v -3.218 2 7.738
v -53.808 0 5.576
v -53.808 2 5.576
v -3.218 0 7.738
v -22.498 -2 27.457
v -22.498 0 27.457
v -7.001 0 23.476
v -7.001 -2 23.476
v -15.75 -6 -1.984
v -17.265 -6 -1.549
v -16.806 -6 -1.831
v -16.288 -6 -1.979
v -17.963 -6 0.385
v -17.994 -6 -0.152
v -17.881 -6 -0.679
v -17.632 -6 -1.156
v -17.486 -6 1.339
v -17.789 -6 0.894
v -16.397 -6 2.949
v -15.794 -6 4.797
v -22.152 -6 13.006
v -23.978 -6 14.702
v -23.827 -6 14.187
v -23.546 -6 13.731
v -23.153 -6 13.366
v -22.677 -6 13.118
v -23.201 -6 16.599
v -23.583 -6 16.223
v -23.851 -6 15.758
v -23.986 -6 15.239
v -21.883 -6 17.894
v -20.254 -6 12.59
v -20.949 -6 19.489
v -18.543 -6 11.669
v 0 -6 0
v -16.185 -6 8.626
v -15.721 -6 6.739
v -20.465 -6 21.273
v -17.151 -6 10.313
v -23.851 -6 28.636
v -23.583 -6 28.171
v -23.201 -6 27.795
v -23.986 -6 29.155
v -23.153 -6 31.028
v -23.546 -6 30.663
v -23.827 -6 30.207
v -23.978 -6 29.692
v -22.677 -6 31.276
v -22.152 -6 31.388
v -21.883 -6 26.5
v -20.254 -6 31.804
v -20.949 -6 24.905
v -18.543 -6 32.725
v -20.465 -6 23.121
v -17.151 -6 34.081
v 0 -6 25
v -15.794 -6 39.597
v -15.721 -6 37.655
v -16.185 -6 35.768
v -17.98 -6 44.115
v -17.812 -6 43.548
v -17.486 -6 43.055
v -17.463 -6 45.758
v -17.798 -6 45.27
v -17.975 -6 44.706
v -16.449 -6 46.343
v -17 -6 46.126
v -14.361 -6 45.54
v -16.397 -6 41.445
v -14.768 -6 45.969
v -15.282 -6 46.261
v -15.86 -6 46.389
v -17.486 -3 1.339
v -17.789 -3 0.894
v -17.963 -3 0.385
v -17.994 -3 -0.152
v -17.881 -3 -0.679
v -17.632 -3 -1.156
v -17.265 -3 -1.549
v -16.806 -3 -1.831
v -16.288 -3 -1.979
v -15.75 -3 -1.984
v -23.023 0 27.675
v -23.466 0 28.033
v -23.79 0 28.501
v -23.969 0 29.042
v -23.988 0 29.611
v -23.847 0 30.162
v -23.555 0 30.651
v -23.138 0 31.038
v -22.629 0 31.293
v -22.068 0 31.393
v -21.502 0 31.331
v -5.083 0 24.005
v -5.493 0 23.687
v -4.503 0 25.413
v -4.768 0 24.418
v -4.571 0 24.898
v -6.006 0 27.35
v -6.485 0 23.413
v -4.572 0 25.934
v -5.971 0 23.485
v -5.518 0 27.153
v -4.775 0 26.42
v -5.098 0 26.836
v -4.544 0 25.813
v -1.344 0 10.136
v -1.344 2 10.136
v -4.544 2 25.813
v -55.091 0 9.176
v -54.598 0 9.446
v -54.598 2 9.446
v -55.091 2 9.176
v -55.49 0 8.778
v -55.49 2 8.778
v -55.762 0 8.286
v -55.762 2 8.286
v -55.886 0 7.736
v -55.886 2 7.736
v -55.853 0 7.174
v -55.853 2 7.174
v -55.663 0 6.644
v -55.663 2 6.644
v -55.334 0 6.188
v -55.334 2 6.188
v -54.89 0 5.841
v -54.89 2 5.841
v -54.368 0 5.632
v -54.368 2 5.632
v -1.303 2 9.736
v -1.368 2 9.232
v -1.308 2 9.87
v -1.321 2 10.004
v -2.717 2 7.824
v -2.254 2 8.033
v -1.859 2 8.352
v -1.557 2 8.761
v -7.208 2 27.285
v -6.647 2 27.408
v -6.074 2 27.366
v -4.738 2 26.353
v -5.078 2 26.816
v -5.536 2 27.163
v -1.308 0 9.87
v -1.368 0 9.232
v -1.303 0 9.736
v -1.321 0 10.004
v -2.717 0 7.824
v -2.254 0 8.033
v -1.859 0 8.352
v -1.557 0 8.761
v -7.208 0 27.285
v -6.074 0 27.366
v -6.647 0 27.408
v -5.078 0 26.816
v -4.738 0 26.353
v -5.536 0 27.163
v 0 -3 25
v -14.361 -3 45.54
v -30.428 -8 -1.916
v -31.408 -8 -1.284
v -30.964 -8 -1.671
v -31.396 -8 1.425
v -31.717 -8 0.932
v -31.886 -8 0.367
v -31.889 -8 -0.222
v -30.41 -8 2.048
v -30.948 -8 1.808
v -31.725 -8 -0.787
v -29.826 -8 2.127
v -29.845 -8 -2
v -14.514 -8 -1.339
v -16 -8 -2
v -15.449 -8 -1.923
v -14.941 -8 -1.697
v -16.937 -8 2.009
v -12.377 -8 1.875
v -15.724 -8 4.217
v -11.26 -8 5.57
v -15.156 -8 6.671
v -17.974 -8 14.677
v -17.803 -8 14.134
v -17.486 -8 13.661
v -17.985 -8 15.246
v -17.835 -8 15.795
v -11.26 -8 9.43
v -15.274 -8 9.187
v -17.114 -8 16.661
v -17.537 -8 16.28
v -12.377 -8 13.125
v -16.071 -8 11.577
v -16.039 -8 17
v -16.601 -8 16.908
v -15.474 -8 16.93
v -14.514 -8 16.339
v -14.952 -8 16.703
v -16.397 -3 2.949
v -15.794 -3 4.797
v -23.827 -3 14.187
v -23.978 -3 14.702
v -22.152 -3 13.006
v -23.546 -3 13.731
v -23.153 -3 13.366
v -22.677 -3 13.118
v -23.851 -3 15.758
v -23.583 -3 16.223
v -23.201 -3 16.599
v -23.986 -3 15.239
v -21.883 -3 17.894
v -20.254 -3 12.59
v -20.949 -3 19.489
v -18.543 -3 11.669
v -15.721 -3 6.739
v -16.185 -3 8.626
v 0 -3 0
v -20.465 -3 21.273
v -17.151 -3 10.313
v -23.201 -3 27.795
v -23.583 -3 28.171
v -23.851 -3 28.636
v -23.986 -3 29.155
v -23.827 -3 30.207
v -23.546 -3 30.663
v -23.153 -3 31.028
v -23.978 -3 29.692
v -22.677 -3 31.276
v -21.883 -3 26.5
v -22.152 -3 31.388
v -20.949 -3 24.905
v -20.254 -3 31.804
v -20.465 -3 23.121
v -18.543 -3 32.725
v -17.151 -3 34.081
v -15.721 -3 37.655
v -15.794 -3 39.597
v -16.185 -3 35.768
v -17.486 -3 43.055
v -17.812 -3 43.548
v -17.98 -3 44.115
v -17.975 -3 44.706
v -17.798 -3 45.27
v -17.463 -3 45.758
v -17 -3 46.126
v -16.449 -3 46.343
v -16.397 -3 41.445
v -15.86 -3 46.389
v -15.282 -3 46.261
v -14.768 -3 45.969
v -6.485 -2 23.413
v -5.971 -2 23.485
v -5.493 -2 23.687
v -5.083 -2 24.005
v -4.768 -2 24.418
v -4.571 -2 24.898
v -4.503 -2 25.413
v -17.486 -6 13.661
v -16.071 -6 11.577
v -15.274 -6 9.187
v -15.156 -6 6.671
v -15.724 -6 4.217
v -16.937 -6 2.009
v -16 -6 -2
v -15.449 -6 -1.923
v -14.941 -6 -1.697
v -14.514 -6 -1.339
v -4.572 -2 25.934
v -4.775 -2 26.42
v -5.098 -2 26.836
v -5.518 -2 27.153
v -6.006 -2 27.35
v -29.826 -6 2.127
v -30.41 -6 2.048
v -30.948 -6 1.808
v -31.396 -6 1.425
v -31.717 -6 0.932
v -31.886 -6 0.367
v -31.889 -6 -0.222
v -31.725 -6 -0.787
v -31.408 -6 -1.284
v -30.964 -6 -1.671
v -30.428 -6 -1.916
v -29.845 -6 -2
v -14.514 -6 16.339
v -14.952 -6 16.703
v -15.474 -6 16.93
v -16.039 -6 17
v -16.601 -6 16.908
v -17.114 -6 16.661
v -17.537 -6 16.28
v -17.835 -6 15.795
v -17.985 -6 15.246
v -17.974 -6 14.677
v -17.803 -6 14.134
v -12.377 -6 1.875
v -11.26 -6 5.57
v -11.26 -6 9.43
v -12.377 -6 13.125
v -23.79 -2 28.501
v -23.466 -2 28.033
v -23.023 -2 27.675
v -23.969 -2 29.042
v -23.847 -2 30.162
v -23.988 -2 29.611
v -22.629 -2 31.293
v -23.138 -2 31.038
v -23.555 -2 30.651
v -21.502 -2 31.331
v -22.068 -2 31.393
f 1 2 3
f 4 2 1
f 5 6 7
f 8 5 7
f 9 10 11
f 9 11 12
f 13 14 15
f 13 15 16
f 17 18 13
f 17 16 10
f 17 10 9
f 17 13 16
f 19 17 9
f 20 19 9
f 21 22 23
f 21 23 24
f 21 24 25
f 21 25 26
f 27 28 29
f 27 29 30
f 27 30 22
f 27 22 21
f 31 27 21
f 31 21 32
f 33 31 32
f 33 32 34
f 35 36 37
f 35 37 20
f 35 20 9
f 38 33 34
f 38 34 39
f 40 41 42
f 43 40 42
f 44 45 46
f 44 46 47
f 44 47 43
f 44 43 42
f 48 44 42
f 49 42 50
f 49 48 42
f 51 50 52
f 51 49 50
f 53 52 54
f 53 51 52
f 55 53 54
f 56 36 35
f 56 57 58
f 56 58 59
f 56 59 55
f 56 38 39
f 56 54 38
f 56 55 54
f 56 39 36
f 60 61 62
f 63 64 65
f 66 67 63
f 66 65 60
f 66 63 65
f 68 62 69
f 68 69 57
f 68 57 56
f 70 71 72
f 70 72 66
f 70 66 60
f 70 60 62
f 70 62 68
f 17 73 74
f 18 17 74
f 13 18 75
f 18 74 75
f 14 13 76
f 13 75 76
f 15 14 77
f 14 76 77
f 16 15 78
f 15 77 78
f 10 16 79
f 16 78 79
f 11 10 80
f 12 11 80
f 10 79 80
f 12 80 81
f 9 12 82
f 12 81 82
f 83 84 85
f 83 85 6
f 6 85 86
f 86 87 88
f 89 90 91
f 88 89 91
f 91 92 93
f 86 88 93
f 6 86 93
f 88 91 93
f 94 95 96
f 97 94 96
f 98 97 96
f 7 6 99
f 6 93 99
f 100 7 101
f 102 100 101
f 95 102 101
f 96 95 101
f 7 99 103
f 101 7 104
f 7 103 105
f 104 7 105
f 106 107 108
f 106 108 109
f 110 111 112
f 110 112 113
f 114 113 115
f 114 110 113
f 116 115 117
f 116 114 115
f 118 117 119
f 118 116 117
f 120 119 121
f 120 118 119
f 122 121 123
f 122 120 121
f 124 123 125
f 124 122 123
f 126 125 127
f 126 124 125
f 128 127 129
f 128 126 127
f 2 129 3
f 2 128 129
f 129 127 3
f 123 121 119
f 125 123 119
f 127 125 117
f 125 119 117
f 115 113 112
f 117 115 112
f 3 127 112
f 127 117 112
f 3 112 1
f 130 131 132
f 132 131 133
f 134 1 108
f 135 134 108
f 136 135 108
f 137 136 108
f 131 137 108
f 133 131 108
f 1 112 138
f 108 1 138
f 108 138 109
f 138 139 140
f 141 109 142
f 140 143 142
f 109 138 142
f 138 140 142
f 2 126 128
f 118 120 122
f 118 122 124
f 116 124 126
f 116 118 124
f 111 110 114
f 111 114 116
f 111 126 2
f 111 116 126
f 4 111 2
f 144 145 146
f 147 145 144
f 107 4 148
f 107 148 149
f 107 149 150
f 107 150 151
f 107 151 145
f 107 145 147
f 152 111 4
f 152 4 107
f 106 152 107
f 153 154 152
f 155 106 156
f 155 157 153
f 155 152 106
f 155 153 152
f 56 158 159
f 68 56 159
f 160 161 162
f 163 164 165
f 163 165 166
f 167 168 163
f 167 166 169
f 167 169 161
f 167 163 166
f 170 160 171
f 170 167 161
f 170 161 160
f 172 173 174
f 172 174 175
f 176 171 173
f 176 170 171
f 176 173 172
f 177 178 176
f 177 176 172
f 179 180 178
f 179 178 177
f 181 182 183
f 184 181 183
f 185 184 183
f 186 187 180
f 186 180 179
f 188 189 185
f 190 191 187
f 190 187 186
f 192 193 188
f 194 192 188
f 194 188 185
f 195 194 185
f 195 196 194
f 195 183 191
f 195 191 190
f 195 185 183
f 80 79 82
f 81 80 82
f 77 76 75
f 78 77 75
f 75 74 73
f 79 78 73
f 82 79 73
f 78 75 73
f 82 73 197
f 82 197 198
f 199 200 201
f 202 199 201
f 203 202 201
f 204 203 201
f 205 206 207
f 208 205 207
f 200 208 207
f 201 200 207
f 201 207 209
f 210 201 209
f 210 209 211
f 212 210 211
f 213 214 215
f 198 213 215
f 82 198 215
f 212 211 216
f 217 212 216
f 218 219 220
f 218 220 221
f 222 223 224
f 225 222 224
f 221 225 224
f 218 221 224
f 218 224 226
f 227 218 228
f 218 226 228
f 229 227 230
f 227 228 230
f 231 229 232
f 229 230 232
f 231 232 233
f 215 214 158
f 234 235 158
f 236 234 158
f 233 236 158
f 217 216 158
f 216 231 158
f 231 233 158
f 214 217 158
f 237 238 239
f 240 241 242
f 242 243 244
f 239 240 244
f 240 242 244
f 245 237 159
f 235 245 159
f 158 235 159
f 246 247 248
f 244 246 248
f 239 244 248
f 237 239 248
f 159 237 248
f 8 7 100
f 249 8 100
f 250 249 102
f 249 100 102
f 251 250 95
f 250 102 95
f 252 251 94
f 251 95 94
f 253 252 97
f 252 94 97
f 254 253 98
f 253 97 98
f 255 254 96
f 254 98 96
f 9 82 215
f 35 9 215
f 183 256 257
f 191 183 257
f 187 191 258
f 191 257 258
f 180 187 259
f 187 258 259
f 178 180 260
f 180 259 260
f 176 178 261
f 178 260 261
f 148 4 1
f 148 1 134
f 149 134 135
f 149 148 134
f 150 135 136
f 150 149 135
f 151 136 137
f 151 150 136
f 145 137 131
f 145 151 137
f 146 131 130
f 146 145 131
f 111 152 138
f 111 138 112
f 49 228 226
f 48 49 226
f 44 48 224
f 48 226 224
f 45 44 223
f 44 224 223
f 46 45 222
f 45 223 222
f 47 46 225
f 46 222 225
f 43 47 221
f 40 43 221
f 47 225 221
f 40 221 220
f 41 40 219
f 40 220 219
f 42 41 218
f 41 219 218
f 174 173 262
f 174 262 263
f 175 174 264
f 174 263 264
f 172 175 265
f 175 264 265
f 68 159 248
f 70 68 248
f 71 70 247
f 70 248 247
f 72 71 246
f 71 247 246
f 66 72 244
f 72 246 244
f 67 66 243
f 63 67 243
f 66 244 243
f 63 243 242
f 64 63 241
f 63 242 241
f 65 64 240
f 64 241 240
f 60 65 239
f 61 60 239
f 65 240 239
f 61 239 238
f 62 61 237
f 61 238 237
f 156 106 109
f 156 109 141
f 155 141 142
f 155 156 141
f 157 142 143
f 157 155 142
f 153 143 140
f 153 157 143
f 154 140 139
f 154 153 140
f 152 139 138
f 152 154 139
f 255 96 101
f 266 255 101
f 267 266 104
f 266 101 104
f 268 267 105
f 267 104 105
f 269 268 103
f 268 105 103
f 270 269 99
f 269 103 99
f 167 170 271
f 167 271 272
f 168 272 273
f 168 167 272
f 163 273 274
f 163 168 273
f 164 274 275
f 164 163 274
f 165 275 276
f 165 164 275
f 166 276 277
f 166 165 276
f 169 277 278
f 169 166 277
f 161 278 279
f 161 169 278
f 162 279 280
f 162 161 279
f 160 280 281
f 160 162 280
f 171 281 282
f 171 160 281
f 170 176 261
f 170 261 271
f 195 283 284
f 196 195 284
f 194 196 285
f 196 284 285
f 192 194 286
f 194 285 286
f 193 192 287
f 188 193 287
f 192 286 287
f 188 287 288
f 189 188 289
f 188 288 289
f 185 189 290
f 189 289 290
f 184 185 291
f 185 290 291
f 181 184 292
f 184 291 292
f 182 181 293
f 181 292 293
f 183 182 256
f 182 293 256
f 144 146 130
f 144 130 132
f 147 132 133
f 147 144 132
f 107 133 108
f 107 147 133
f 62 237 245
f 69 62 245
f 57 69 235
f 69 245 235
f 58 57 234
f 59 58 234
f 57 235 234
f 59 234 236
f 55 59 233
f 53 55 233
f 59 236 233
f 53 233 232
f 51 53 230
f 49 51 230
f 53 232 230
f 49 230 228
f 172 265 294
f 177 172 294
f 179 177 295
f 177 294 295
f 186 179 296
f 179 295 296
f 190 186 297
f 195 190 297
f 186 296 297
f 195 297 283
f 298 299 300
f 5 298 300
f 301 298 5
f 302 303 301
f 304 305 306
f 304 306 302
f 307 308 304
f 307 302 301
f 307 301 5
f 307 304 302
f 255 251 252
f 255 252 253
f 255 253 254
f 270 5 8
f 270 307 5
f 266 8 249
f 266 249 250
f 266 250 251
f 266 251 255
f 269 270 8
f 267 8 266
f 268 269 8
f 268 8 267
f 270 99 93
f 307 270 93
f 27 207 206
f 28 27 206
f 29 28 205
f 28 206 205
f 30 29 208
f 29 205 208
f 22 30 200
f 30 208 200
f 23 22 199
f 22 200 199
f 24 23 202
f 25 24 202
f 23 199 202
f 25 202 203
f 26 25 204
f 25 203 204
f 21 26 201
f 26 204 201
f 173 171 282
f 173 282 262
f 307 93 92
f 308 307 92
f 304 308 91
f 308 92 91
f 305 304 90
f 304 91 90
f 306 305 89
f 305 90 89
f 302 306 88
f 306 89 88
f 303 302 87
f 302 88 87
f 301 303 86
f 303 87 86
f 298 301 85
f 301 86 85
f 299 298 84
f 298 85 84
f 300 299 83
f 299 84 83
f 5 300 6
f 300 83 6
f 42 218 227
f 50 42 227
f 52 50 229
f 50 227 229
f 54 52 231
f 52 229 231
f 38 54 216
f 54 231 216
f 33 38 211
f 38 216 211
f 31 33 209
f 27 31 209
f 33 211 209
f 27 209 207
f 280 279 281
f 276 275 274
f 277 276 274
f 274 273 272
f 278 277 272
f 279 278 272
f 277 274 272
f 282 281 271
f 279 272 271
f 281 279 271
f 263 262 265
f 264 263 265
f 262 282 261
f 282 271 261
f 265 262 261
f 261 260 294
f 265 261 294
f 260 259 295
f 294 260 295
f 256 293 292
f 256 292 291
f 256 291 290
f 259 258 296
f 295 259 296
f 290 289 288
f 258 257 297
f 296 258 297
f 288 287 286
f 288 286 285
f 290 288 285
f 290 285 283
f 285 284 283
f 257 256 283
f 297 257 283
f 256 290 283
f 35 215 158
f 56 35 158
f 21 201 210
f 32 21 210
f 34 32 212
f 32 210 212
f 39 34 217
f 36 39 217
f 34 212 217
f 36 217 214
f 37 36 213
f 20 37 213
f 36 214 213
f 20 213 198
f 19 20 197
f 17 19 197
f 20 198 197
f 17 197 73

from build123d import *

# Parameters (mm, degrees)
F2_DEPTH  = 2
F4_DEPTH  = 2
F7_DEPTH  = 3
F10_DEPTH = 2
F12_DEPTH = 2


with BuildPart() as f2:
    # F1 (on Front) → F2 (new body)
    with BuildSketch(Plane.XZ):
        with BuildLine():
            ThreePointArc((-22.4976340457, 27.4567758947), (-20.7742896124, 27.8134864408), (-20, 29.3938769134))
            ThreePointArc((-20, 29.3938769134), (-20.4196095275, 30.619587301), (-21.5023659543, 31.3309779321))
            ThreePointArc((-21.5023659543, 31.3309779321), (-23.9371010187, 29.8915109591), (-22.4976340457, 27.4567758947))
        make_face()
        with BuildLine():
            ThreePointArc((-4.5031918506, 25.4128045476), (-4.9228013781, 26.6385149352), (-6.0055578049, 27.3499055663))
            ThreePointArc((-6.0055578049, 27.3499055663), (-8.4402928693, 25.9104385933), (-7.0008258964, 23.4757035289))
            ThreePointArc((-7.0008258964, 23.4757035289), (-5.277481463, 23.832414075), (-4.5031918506, 25.4128045476))
        make_face()
        with BuildLine():
            ThreePointArc((-21.5023659543, 31.3309779321), (-20.4196095275, 30.619587301), (-20, 29.3938769134))
            ThreePointArc((-20, 29.3938769134), (-20.7742896124, 27.8134864408), (-22.4976340457, 27.4567758947))
            Line((-22.4976340457, 27.4567758947), (-7.0008258964, 23.4757035289))
            ThreePointArc((-7.0008258964, 23.4757035289), (-8.4402928693, 25.9104385933), (-6.0055578049, 27.3499055663))
            Line((-6.0055578049, 27.3499055663), (-21.5023659543, 31.3309779321))
        make_face()
    extrude(amount=F2_DEPTH)


with BuildPart() as f4:
    # F3 (on Front) → F4 (new body)
    with BuildSketch(Plane.XZ):
        with BuildLine():
            ThreePointArc((-7.2077649929, 27.2845889067), (-7.6413600534, 23.7682459009), (-4.5031918506, 25.4128045476))
            ThreePointArc((-4.5031918506, 25.4128045476), (-4.5133195446, 25.6138224716), (-4.5436000564, 25.8128045476))
            ThreePointArc((-4.5436000564, 25.8128045476), (-5.5360800401, 27.1634315055), (-7.2077649929, 27.2845889067))
        make_face()
        with BuildLine():
            ThreePointArc((-4.5436000564, 25.8128045476), (-4.5133195446, 25.6138224716), (-4.5031918506, 25.4128045476))
            ThreePointArc((-4.5031918506, 25.4128045476), (-7.6413600534, 23.7682459009), (-7.2077649929, 27.2845889067))
            Line((-7.2077649929, 27.2845889067), (-54.5975598486, 9.4462217298))
            ThreePointArc((-54.5975598486, 9.4462217298), (-52.7548185036, 9.2189960173), (-51.8929867063, 7.5744373707))
            ThreePointArc((-51.8929867063, 7.5744373707), (-52.4489024417, 6.1907391967), (-53.8076073431, 5.5762606107))
            Line((-53.8076073431, 5.5762606107), (-3.2178124874, 7.7378934337))
            ThreePointArc((-3.2178124874, 7.7378934337), (-4.8790375607, 10.9676181215), (-1.3436000564, 10.1360701938))
            Line((-1.3436000564, 10.1360701938), (-4.5436000564, 25.8128045476))
        make_face()
        with BuildLine():
            ThreePointArc((-1.3031918506, 9.7360701938), (-1.3133195446, 9.9370881178), (-1.3436000564, 10.1360701938))
            ThreePointArc((-1.3436000564, 10.1360701938), (-4.8790375607, 10.9676181215), (-3.2178124874, 7.7378934337))
            ThreePointArc((-3.2178124874, 7.7378934337), (-1.859107586, 8.3523720198), (-1.3031918506, 9.7360701938))
        make_face()
        with BuildLine():
            ThreePointArc((-51.8929867063, 7.5744373707), (-52.7548185036, 9.2189960173), (-54.5975598486, 9.4462217298))
            ThreePointArc((-54.5975598486, 9.4462217298), (-55.8525785005, 7.1744373707), (-53.8076073431, 5.5762606107))
            ThreePointArc((-53.8076073431, 5.5762606107), (-52.4489024417, 6.1907391967), (-51.8929867063, 7.5744373707))
        make_face()
    extrude(amount=-F4_DEPTH)


with BuildPart() as f7:
    # F6 (on Front) → F7 (new body)
    with BuildSketch(Plane.XZ):
        with BuildLine():
            ThreePointArc((-15.75, -1.9843134833), (-14.5, -1.3228756555), (-14, 0))
            ThreePointArc((-14, 0), (-15.2827177269, 1.8669510279), (-17.4855061407, 1.339130877))
            ThreePointArc((-17.4855061407, 1.339130877), (-17.7728337373, -0.9257756424), (-15.75, -1.9843134833))
        make_face()
        with BuildLine():
            ThreePointArc((-17.4855061407, 1.339130877), (-15.2827177269, 1.8669510279), (-14, 0))
            ThreePointArc((-14, 0), (-14.5, -1.3228756555), (-15.75, -1.9843134833))
            Line((-15.75, -1.9843134833), (0, 0))
            Line((0, 0), (0, 25))
            Line((0, 25), (-14.3608981549, 45.5398896277))
            ThreePointArc((-14.3608981549, 45.5398896277), (-14.0923569922, 44.9946249095), (-14, 44.3938769134))
            ThreePointArc((-14, 44.3938769134), (-15.2827177269, 42.5269258855), (-17.4855061407, 43.0547460364))
            ThreePointArc((-17.4855061407, 43.0547460364), (-16.1854407971, 35.7680532322), (-22.1521728074, 31.3880793697))
            ThreePointArc((-22.1521728074, 31.3880793697), (-20.6406519237, 30.8609054773), (-20, 29.3938769134))
            ThreePointArc((-20, 29.3938769134), (-21.1060797511, 27.6047691501), (-23.2009065886, 27.7945572564))
            ThreePointArc((-23.2009065886, 27.7945572564), (-20.4040796488, 22.1969384567), (-23.2009065886, 16.599319657))
            ThreePointArc((-23.2009065886, 16.599319657), (-21.1060797511, 16.7891077633), (-20, 15))
            ThreePointArc((-20, 15), (-20.6406519237, 13.5329714361), (-22.1521728074, 13.0057975437))
            ThreePointArc((-22.1521728074, 13.0057975437), (-16.1854407971, 8.6258236812), (-17.4855061407, 1.339130877))
        make_face()
        with BuildLine():
            ThreePointArc((-23.2009065886, 16.599319657), (-23.9199104817, 14.4396931713), (-22.1521728074, 13.0057975437))
            ThreePointArc((-22.1521728074, 13.0057975437), (-20.6406519237, 13.5329714361), (-20, 15))
            ThreePointArc((-20, 15), (-21.1060797511, 16.7891077633), (-23.2009065886, 16.599319657))
        make_face()
        with BuildLine():
            ThreePointArc((-22.1521728074, 31.3880793697), (-23.9199104817, 29.9541837421), (-23.2009065886, 27.7945572564))
            ThreePointArc((-23.2009065886, 27.7945572564), (-21.1060797511, 27.6047691501), (-20, 29.3938769134))
            ThreePointArc((-20, 29.3938769134), (-20.6406519237, 30.8609054773), (-22.1521728074, 31.3880793697))
        make_face()
        with BuildLine():
            ThreePointArc((-14, 44.3938769134), (-14.0923569922, 44.9946249095), (-14.3608981549, 45.5398896277))
            ThreePointArc((-14.3608981549, 45.5398896277), (-17.2449428009, 45.9591620064), (-17.4855061407, 43.0547460364))
            ThreePointArc((-17.4855061407, 43.0547460364), (-15.2827177269, 42.5269258855), (-14, 44.3938769134))
        make_face()
    extrude(amount=F7_DEPTH)


with BuildPart() as f7_1:
    # F8: moved
    add(f7.part.moved(Location((0, -3, 0))))


with BuildPart() as f10:
    # F9 (on face) → F10 (new body)
    with BuildSketch(Plane.XZ.offset(6)):
        with BuildLine():
            ThreePointArc((-14.5144937322, -1.3391307361), (-14.133048938, -0.7172821845), (-14, 0))
            ThreePointArc((-14, 0), (-15.2827177269, 1.8669510279), (-17.4855061407, 1.339130877))
            ThreePointArc((-17.4855061407, 1.339130877), (-17.3391308066, -1.4855062043), (-14.5144937322, -1.3391307361))
        make_face()
        with BuildLine():
            ThreePointArc((-17.4855061407, 1.339130877), (-15.2827177269, 1.8669510279), (-14, 0))
            ThreePointArc((-14, 0), (-14.133048938, -0.7172821845), (-14.5144937322, -1.3391307361))
            ThreePointArc((-14.5144937322, -1.3391307361), (-11.1185016612, 7.5), (-14.5144937322, 16.3391307361))
            ThreePointArc((-14.5144937322, 16.3391307361), (-14.133048938, 15.7172821845), (-14, 15))
            ThreePointArc((-14, 15), (-15.2827178155, 13.133048938), (-17.4855062678, 13.6608692639))
            ThreePointArc((-17.4855062678, 13.6608692639), (-15.1185016612, 7.5000000949), (-17.4855061407, 1.339130877))
        make_face()
        with BuildLine():
            ThreePointArc((-14.5144937322, 16.3391307361), (-17.3391307361, 16.4855062678), (-17.4855062678, 13.6608692639))
            ThreePointArc((-17.4855062678, 13.6608692639), (-15.2827178155, 13.133048938), (-14, 15))
            ThreePointArc((-14, 15), (-14.133048938, 15.7172821845), (-14.5144937322, 16.3391307361))
        make_face()
    extrude(amount=F10_DEPTH)

    # F11 (on face) → F12 (join, through all)
    with BuildSketch(Plane.XZ.offset(8)):
        with BuildLine():
            Line((-29.8451329624, -2), (-16, -2))
            Line((-16, -2), (-15.9816370049, 1.9999156983))
            Line((-15.9816370049, 1.9999156983), (-29.8261863834, 2.1270347527))
            ThreePointArc((-29.8261863834, 2.1270347527), (-28.3792917586, 1.5160046749), (-27.7815720957, 0.0635608668))
            ThreePointArc((-27.7815720957, 0.0635608668), (-28.3859750802, -1.3955970155), (-29.8451329624, -2))
        make_face()
        with BuildLine():
            ThreePointArc((-29.8261863834, 2.1270347527), (-31.9086720839, 0.0730342561), (-29.8451329624, -2))
            ThreePointArc((-29.8451329624, -2), (-28.3859750802, -1.3955970155), (-27.7815720957, 0.0635608668))
            ThreePointArc((-27.7815720957, 0.0635608668), (-28.3792917586, 1.5160046749), (-29.8261863834, 2.1270347527))
        make_face()
    extrude(amount=-F12_DEPTH)


solid = Compound([f2.part, f4.part, f7_1.part, f10.part])
